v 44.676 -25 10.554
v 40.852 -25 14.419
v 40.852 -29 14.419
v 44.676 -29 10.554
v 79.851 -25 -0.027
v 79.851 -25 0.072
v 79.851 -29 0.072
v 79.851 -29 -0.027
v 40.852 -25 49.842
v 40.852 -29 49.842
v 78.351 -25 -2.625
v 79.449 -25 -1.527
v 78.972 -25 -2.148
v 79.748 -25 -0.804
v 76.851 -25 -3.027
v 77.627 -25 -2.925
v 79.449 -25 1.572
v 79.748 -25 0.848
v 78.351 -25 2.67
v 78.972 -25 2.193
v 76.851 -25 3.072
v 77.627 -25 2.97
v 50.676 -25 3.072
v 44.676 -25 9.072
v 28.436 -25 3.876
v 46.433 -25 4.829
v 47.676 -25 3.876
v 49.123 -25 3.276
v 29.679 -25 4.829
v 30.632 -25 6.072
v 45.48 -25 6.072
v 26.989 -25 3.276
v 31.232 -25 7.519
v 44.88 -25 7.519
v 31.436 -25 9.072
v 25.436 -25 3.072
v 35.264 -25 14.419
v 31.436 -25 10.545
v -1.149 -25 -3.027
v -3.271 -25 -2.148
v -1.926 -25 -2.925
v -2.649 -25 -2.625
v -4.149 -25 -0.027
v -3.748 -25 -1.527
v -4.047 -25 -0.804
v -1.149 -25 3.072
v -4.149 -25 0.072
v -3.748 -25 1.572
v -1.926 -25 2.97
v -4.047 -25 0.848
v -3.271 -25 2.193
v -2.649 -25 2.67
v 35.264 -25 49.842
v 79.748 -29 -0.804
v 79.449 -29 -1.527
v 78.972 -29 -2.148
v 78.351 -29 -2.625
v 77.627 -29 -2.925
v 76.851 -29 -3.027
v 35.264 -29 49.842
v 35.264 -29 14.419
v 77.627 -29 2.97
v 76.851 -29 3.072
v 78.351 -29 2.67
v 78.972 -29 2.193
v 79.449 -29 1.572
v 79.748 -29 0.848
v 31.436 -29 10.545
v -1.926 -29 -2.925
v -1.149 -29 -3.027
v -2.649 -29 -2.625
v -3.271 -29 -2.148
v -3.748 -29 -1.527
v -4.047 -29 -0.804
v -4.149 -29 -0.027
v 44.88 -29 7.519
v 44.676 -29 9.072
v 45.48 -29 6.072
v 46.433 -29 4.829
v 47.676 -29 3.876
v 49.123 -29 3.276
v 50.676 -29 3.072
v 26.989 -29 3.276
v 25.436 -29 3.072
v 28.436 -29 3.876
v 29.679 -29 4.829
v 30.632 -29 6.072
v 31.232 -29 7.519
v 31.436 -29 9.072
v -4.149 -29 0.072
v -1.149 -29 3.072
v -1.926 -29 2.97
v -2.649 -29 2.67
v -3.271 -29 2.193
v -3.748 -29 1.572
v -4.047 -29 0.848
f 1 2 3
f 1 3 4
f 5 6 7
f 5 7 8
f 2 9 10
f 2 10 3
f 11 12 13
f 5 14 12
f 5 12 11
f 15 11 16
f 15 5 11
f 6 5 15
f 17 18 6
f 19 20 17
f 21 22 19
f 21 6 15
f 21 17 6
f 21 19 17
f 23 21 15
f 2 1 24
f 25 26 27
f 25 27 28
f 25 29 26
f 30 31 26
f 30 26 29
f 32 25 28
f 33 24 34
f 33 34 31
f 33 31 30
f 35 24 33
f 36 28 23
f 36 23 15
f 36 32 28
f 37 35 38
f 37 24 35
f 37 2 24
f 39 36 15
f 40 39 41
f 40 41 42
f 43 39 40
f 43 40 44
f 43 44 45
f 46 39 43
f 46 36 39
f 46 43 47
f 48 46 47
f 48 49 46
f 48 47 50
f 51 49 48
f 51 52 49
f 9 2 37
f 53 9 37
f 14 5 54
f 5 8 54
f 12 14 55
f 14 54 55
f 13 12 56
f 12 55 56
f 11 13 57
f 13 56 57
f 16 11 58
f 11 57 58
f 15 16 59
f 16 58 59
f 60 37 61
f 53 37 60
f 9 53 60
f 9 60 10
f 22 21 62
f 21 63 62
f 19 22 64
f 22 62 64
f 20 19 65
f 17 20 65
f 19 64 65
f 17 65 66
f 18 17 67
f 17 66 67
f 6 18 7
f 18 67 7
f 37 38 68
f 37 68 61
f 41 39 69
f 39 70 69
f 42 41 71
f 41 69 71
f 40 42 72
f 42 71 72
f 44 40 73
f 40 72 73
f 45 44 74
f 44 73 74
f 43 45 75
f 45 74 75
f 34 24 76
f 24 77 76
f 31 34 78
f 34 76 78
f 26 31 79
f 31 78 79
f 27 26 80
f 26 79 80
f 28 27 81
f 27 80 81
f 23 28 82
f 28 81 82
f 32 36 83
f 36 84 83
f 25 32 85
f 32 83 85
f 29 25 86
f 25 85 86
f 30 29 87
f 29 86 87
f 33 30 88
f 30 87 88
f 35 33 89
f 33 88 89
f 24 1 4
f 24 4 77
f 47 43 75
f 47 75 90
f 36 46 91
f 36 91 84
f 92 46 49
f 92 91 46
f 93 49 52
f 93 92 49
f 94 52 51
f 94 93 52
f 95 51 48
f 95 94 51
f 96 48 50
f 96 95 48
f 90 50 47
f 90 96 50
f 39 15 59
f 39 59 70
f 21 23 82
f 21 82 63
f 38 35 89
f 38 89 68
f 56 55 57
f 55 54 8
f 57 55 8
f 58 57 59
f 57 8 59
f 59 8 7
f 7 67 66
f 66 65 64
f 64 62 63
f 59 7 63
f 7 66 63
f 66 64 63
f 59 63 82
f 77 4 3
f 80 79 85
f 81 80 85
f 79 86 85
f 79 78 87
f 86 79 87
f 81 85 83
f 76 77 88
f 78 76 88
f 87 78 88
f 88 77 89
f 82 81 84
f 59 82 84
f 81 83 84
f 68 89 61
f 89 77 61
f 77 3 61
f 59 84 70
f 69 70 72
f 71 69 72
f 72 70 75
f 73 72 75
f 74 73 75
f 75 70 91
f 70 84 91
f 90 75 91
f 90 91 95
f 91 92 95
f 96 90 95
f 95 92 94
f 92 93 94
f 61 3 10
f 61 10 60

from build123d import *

# Parameters (mm, degrees)
PAD002_DEPTH = 4
FILLET005_R  = 3
FILLET006_R  = 6


with BuildPart() as part:
    # Sketch003 → Pad002 (new body)
    with BuildSketch(Plane.XZ.offset(25)):
        Polygon((-4.149489, 3.072018), (31.436102, 3.072018), (31.436102, 10.54521), (35.263586, 14.418702), (35.263586, 49.841579), (40.852331, 49.841579), (40.852331, 14.418702), (44.676023, 10.554439), (44.676023, 3.072018), (79.850511, 3.072018), (79.850511, -3.027098), (-4.149489, -3.027098), align=None)
    extrude(amount=PAD002_DEPTH)

    # Fillet005
    fillet005_edges = [part.edges().sort_by_distance(p)[0] for p in [
        (79.850511, -27, 3.072018),
        (79.850511, -27, -3.027098),
        (-4.149489, -27, -3.027098),
        (-4.149489, -27, 3.072018),
    ]]
    fillet(fillet005_edges, radius=FILLET005_R)

    # Fillet006
    fillet006_edges = [part.edges().sort_by_distance(p)[0] for p in [
        (44.676023, -27, 3.072018),
        (31.436102, -27, 3.072018),
    ]]
    fillet(fillet006_edges, radius=FILLET006_R)


solid = part.part
